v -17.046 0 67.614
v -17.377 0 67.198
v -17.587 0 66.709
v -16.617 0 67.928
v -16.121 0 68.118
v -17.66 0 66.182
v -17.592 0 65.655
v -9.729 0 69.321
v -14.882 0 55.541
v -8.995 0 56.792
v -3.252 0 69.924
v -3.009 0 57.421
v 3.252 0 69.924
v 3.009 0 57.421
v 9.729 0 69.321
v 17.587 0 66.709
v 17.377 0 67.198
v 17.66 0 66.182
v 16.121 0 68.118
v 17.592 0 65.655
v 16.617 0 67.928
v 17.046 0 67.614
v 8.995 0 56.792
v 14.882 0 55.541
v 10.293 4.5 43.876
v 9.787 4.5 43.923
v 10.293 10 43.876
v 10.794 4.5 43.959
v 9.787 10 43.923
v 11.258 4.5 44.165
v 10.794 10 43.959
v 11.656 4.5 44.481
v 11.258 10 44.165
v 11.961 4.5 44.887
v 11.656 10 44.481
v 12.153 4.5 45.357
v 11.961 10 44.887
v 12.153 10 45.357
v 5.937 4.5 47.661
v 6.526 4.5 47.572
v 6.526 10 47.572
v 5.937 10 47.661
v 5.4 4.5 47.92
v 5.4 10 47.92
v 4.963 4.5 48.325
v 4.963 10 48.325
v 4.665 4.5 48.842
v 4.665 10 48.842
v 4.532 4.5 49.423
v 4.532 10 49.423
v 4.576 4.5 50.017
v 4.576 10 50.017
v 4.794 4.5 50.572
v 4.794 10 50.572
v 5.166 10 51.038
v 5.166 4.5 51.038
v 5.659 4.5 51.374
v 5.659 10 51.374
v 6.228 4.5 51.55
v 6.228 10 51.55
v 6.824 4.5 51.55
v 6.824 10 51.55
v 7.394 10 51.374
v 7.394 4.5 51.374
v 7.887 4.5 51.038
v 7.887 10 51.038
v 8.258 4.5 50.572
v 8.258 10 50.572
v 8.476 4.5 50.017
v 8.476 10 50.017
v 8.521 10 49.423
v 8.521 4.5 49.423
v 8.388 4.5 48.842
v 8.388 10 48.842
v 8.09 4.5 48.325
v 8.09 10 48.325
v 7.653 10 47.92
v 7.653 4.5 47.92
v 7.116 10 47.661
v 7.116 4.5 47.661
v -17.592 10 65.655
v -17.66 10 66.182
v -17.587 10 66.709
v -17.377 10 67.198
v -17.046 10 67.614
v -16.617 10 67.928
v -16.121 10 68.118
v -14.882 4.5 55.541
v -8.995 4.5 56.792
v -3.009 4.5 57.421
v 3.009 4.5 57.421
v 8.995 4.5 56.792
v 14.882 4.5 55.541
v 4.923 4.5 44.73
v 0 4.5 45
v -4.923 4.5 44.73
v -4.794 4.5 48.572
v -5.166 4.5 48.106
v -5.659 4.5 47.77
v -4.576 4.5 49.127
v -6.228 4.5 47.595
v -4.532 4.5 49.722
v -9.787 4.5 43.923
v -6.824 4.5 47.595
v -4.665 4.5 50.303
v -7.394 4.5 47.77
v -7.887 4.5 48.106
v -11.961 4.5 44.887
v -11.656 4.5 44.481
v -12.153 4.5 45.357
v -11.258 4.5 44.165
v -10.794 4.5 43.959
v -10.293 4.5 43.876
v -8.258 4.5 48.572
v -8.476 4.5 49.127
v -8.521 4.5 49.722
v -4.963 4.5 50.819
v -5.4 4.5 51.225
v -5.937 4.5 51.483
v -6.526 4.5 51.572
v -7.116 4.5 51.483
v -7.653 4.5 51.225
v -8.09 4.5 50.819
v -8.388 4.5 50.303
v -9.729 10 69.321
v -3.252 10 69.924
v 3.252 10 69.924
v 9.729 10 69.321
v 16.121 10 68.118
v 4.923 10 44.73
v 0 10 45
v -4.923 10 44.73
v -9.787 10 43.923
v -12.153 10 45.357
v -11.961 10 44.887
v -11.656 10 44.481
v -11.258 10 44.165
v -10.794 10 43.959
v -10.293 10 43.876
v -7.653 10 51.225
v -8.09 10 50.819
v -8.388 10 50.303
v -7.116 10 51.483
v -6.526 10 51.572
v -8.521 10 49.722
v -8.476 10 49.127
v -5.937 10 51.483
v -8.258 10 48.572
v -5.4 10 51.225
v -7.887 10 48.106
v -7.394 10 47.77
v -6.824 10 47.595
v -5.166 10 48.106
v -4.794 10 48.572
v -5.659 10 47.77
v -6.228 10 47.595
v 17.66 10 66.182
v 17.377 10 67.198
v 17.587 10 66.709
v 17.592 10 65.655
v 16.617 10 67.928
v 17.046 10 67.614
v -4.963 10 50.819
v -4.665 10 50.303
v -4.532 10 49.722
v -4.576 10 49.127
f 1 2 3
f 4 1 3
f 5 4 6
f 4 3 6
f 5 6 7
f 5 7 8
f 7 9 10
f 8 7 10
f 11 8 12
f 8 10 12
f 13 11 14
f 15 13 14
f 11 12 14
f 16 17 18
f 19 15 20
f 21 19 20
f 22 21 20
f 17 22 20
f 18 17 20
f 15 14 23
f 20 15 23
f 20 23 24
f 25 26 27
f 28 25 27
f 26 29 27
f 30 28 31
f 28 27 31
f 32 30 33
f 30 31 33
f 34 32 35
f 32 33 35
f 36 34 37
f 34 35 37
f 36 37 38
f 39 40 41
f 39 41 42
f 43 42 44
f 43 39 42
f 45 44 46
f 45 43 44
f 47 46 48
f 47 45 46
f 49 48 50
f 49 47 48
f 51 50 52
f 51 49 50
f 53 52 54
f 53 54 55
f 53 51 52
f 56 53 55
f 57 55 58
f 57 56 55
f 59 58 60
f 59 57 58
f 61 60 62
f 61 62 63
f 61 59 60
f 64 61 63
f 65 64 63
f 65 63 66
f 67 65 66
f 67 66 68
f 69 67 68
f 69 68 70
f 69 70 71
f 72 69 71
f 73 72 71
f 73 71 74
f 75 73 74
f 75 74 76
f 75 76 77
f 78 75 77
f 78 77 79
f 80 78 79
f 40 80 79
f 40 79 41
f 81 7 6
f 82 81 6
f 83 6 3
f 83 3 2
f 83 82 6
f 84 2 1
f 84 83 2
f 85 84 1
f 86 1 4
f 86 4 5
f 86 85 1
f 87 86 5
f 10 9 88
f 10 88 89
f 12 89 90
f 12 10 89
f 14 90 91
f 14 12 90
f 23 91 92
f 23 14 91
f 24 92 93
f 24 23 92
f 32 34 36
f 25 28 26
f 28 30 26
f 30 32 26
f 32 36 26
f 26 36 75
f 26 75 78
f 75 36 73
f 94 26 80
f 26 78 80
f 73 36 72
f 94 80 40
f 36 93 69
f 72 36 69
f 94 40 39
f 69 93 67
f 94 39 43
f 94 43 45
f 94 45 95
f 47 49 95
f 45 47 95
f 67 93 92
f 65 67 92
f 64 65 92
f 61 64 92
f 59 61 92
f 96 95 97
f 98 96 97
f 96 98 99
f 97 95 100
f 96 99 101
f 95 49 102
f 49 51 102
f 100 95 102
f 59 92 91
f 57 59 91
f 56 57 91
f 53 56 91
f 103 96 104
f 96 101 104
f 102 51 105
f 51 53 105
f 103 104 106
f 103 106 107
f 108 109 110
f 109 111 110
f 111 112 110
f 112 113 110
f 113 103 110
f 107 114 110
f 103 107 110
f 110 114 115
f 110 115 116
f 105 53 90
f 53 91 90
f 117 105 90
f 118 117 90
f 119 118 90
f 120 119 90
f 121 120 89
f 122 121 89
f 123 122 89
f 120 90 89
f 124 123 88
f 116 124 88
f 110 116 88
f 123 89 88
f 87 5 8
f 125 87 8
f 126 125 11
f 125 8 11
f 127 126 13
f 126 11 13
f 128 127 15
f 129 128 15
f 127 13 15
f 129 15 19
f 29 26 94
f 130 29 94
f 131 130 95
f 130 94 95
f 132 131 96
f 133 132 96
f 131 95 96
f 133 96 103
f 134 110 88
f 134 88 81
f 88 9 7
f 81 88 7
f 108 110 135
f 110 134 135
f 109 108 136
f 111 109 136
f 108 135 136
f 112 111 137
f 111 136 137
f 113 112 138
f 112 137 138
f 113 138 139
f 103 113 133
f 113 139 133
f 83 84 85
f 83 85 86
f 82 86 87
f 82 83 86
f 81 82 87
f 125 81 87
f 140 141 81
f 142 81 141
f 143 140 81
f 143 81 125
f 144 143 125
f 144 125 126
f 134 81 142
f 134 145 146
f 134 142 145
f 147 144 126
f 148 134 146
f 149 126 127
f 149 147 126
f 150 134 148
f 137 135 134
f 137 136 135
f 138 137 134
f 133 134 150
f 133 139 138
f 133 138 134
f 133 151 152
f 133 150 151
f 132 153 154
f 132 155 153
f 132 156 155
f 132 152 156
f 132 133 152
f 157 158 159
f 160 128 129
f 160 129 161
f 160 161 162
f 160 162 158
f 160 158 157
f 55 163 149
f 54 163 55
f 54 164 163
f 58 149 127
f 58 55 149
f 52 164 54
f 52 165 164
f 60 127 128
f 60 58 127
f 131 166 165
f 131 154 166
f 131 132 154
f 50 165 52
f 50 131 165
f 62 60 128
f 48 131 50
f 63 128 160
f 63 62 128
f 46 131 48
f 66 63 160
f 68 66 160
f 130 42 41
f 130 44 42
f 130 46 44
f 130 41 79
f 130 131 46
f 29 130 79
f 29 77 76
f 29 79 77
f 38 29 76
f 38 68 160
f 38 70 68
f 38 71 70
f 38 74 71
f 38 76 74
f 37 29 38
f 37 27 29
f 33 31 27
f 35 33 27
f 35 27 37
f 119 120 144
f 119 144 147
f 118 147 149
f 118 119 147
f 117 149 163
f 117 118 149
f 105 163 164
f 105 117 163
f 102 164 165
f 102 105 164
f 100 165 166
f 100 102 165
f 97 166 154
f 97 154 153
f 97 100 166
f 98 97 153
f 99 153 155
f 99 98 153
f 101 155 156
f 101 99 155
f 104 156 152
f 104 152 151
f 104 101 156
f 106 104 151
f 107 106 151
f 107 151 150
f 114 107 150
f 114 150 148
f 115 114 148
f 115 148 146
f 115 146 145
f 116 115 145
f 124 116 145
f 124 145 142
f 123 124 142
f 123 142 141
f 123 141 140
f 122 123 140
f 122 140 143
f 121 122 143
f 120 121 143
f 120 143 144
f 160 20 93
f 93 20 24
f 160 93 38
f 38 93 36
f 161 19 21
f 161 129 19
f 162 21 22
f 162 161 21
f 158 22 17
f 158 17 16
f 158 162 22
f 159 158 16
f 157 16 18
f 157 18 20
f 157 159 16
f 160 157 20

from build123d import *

# Parameters (mm, degrees)
SKETCH_1_R          = 2
EXTRUDE_1_DEPTH     = 10
CUT_EXTRUDE_1_DEPTH = 4.5
FILLET_1_R          = 2


with BuildPart() as part:
    # ｽｹｯﾁ1 → ﾎﾞｽ - 押し出し1 (new body)
    with BuildSketch(Plane(origin=(0, 0, 0), x_dir=(1, 0, 0), z_dir=(0, 1, 0))):
        with BuildLine():
            Line((-11.64685703, -43.466662183), (-18.117333157, -67.61480784))
            ThreePointArc((-18.117333157, -67.61480784), (0, -70), (18.117333157, -67.61480784))
            Line((18.117333157, -67.61480784), (11.64685703, -43.466662183))
            ThreePointArc((11.64685703, -43.466662183), (0, -45), (-11.64685703, -43.466662183))
        make_face()
        with Locations(Location((-6.526309611, -49.572243069, 0), (0, 0, 270))):
            Circle(SKETCH_1_R, mode=Mode.SUBTRACT)
        with Locations(Location((6.526309611, -49.572243069, 0), (0, 0, 90))):
            Circle(SKETCH_1_R, mode=Mode.SUBTRACT)
    extrude(amount=EXTRUDE_1_DEPTH)

    # ｽｹｯﾁ2 → ｶｯﾄ - 押し出し1 (cut)
    with BuildSketch(Plane.XZ):
        with BuildLine():
            Line((14.882095093, 55.540735012), (11.64685703, 43.466662183))
            ThreePointArc((11.64685703, 43.466662183), (0, 45), (-11.64685703, 43.466662183))
            Line((-11.64685703, 43.466662183), (-14.882095093, 55.540735012))
            ThreePointArc((-14.882095093, 55.540735012), (0, 57.5), (14.882095093, 55.540735012))
        make_face()
    extrude(amount=-CUT_EXTRUDE_1_DEPTH, mode=Mode.SUBTRACT)

    # ﾌｨﾚｯﾄ1
    fillet_1_edges = [part.edges().sort_by_distance(p)[0] for p in [
        (-18.117333157, 5, 67.61480784),
        (-11.64685703, 7.25, 43.466662183),
        (11.64685703, 7.25, 43.466662183),
        (18.117333157, 5, 67.61480784),
    ]]
    fillet(fillet_1_edges, radius=FILLET_1_R)


solid = part.part
